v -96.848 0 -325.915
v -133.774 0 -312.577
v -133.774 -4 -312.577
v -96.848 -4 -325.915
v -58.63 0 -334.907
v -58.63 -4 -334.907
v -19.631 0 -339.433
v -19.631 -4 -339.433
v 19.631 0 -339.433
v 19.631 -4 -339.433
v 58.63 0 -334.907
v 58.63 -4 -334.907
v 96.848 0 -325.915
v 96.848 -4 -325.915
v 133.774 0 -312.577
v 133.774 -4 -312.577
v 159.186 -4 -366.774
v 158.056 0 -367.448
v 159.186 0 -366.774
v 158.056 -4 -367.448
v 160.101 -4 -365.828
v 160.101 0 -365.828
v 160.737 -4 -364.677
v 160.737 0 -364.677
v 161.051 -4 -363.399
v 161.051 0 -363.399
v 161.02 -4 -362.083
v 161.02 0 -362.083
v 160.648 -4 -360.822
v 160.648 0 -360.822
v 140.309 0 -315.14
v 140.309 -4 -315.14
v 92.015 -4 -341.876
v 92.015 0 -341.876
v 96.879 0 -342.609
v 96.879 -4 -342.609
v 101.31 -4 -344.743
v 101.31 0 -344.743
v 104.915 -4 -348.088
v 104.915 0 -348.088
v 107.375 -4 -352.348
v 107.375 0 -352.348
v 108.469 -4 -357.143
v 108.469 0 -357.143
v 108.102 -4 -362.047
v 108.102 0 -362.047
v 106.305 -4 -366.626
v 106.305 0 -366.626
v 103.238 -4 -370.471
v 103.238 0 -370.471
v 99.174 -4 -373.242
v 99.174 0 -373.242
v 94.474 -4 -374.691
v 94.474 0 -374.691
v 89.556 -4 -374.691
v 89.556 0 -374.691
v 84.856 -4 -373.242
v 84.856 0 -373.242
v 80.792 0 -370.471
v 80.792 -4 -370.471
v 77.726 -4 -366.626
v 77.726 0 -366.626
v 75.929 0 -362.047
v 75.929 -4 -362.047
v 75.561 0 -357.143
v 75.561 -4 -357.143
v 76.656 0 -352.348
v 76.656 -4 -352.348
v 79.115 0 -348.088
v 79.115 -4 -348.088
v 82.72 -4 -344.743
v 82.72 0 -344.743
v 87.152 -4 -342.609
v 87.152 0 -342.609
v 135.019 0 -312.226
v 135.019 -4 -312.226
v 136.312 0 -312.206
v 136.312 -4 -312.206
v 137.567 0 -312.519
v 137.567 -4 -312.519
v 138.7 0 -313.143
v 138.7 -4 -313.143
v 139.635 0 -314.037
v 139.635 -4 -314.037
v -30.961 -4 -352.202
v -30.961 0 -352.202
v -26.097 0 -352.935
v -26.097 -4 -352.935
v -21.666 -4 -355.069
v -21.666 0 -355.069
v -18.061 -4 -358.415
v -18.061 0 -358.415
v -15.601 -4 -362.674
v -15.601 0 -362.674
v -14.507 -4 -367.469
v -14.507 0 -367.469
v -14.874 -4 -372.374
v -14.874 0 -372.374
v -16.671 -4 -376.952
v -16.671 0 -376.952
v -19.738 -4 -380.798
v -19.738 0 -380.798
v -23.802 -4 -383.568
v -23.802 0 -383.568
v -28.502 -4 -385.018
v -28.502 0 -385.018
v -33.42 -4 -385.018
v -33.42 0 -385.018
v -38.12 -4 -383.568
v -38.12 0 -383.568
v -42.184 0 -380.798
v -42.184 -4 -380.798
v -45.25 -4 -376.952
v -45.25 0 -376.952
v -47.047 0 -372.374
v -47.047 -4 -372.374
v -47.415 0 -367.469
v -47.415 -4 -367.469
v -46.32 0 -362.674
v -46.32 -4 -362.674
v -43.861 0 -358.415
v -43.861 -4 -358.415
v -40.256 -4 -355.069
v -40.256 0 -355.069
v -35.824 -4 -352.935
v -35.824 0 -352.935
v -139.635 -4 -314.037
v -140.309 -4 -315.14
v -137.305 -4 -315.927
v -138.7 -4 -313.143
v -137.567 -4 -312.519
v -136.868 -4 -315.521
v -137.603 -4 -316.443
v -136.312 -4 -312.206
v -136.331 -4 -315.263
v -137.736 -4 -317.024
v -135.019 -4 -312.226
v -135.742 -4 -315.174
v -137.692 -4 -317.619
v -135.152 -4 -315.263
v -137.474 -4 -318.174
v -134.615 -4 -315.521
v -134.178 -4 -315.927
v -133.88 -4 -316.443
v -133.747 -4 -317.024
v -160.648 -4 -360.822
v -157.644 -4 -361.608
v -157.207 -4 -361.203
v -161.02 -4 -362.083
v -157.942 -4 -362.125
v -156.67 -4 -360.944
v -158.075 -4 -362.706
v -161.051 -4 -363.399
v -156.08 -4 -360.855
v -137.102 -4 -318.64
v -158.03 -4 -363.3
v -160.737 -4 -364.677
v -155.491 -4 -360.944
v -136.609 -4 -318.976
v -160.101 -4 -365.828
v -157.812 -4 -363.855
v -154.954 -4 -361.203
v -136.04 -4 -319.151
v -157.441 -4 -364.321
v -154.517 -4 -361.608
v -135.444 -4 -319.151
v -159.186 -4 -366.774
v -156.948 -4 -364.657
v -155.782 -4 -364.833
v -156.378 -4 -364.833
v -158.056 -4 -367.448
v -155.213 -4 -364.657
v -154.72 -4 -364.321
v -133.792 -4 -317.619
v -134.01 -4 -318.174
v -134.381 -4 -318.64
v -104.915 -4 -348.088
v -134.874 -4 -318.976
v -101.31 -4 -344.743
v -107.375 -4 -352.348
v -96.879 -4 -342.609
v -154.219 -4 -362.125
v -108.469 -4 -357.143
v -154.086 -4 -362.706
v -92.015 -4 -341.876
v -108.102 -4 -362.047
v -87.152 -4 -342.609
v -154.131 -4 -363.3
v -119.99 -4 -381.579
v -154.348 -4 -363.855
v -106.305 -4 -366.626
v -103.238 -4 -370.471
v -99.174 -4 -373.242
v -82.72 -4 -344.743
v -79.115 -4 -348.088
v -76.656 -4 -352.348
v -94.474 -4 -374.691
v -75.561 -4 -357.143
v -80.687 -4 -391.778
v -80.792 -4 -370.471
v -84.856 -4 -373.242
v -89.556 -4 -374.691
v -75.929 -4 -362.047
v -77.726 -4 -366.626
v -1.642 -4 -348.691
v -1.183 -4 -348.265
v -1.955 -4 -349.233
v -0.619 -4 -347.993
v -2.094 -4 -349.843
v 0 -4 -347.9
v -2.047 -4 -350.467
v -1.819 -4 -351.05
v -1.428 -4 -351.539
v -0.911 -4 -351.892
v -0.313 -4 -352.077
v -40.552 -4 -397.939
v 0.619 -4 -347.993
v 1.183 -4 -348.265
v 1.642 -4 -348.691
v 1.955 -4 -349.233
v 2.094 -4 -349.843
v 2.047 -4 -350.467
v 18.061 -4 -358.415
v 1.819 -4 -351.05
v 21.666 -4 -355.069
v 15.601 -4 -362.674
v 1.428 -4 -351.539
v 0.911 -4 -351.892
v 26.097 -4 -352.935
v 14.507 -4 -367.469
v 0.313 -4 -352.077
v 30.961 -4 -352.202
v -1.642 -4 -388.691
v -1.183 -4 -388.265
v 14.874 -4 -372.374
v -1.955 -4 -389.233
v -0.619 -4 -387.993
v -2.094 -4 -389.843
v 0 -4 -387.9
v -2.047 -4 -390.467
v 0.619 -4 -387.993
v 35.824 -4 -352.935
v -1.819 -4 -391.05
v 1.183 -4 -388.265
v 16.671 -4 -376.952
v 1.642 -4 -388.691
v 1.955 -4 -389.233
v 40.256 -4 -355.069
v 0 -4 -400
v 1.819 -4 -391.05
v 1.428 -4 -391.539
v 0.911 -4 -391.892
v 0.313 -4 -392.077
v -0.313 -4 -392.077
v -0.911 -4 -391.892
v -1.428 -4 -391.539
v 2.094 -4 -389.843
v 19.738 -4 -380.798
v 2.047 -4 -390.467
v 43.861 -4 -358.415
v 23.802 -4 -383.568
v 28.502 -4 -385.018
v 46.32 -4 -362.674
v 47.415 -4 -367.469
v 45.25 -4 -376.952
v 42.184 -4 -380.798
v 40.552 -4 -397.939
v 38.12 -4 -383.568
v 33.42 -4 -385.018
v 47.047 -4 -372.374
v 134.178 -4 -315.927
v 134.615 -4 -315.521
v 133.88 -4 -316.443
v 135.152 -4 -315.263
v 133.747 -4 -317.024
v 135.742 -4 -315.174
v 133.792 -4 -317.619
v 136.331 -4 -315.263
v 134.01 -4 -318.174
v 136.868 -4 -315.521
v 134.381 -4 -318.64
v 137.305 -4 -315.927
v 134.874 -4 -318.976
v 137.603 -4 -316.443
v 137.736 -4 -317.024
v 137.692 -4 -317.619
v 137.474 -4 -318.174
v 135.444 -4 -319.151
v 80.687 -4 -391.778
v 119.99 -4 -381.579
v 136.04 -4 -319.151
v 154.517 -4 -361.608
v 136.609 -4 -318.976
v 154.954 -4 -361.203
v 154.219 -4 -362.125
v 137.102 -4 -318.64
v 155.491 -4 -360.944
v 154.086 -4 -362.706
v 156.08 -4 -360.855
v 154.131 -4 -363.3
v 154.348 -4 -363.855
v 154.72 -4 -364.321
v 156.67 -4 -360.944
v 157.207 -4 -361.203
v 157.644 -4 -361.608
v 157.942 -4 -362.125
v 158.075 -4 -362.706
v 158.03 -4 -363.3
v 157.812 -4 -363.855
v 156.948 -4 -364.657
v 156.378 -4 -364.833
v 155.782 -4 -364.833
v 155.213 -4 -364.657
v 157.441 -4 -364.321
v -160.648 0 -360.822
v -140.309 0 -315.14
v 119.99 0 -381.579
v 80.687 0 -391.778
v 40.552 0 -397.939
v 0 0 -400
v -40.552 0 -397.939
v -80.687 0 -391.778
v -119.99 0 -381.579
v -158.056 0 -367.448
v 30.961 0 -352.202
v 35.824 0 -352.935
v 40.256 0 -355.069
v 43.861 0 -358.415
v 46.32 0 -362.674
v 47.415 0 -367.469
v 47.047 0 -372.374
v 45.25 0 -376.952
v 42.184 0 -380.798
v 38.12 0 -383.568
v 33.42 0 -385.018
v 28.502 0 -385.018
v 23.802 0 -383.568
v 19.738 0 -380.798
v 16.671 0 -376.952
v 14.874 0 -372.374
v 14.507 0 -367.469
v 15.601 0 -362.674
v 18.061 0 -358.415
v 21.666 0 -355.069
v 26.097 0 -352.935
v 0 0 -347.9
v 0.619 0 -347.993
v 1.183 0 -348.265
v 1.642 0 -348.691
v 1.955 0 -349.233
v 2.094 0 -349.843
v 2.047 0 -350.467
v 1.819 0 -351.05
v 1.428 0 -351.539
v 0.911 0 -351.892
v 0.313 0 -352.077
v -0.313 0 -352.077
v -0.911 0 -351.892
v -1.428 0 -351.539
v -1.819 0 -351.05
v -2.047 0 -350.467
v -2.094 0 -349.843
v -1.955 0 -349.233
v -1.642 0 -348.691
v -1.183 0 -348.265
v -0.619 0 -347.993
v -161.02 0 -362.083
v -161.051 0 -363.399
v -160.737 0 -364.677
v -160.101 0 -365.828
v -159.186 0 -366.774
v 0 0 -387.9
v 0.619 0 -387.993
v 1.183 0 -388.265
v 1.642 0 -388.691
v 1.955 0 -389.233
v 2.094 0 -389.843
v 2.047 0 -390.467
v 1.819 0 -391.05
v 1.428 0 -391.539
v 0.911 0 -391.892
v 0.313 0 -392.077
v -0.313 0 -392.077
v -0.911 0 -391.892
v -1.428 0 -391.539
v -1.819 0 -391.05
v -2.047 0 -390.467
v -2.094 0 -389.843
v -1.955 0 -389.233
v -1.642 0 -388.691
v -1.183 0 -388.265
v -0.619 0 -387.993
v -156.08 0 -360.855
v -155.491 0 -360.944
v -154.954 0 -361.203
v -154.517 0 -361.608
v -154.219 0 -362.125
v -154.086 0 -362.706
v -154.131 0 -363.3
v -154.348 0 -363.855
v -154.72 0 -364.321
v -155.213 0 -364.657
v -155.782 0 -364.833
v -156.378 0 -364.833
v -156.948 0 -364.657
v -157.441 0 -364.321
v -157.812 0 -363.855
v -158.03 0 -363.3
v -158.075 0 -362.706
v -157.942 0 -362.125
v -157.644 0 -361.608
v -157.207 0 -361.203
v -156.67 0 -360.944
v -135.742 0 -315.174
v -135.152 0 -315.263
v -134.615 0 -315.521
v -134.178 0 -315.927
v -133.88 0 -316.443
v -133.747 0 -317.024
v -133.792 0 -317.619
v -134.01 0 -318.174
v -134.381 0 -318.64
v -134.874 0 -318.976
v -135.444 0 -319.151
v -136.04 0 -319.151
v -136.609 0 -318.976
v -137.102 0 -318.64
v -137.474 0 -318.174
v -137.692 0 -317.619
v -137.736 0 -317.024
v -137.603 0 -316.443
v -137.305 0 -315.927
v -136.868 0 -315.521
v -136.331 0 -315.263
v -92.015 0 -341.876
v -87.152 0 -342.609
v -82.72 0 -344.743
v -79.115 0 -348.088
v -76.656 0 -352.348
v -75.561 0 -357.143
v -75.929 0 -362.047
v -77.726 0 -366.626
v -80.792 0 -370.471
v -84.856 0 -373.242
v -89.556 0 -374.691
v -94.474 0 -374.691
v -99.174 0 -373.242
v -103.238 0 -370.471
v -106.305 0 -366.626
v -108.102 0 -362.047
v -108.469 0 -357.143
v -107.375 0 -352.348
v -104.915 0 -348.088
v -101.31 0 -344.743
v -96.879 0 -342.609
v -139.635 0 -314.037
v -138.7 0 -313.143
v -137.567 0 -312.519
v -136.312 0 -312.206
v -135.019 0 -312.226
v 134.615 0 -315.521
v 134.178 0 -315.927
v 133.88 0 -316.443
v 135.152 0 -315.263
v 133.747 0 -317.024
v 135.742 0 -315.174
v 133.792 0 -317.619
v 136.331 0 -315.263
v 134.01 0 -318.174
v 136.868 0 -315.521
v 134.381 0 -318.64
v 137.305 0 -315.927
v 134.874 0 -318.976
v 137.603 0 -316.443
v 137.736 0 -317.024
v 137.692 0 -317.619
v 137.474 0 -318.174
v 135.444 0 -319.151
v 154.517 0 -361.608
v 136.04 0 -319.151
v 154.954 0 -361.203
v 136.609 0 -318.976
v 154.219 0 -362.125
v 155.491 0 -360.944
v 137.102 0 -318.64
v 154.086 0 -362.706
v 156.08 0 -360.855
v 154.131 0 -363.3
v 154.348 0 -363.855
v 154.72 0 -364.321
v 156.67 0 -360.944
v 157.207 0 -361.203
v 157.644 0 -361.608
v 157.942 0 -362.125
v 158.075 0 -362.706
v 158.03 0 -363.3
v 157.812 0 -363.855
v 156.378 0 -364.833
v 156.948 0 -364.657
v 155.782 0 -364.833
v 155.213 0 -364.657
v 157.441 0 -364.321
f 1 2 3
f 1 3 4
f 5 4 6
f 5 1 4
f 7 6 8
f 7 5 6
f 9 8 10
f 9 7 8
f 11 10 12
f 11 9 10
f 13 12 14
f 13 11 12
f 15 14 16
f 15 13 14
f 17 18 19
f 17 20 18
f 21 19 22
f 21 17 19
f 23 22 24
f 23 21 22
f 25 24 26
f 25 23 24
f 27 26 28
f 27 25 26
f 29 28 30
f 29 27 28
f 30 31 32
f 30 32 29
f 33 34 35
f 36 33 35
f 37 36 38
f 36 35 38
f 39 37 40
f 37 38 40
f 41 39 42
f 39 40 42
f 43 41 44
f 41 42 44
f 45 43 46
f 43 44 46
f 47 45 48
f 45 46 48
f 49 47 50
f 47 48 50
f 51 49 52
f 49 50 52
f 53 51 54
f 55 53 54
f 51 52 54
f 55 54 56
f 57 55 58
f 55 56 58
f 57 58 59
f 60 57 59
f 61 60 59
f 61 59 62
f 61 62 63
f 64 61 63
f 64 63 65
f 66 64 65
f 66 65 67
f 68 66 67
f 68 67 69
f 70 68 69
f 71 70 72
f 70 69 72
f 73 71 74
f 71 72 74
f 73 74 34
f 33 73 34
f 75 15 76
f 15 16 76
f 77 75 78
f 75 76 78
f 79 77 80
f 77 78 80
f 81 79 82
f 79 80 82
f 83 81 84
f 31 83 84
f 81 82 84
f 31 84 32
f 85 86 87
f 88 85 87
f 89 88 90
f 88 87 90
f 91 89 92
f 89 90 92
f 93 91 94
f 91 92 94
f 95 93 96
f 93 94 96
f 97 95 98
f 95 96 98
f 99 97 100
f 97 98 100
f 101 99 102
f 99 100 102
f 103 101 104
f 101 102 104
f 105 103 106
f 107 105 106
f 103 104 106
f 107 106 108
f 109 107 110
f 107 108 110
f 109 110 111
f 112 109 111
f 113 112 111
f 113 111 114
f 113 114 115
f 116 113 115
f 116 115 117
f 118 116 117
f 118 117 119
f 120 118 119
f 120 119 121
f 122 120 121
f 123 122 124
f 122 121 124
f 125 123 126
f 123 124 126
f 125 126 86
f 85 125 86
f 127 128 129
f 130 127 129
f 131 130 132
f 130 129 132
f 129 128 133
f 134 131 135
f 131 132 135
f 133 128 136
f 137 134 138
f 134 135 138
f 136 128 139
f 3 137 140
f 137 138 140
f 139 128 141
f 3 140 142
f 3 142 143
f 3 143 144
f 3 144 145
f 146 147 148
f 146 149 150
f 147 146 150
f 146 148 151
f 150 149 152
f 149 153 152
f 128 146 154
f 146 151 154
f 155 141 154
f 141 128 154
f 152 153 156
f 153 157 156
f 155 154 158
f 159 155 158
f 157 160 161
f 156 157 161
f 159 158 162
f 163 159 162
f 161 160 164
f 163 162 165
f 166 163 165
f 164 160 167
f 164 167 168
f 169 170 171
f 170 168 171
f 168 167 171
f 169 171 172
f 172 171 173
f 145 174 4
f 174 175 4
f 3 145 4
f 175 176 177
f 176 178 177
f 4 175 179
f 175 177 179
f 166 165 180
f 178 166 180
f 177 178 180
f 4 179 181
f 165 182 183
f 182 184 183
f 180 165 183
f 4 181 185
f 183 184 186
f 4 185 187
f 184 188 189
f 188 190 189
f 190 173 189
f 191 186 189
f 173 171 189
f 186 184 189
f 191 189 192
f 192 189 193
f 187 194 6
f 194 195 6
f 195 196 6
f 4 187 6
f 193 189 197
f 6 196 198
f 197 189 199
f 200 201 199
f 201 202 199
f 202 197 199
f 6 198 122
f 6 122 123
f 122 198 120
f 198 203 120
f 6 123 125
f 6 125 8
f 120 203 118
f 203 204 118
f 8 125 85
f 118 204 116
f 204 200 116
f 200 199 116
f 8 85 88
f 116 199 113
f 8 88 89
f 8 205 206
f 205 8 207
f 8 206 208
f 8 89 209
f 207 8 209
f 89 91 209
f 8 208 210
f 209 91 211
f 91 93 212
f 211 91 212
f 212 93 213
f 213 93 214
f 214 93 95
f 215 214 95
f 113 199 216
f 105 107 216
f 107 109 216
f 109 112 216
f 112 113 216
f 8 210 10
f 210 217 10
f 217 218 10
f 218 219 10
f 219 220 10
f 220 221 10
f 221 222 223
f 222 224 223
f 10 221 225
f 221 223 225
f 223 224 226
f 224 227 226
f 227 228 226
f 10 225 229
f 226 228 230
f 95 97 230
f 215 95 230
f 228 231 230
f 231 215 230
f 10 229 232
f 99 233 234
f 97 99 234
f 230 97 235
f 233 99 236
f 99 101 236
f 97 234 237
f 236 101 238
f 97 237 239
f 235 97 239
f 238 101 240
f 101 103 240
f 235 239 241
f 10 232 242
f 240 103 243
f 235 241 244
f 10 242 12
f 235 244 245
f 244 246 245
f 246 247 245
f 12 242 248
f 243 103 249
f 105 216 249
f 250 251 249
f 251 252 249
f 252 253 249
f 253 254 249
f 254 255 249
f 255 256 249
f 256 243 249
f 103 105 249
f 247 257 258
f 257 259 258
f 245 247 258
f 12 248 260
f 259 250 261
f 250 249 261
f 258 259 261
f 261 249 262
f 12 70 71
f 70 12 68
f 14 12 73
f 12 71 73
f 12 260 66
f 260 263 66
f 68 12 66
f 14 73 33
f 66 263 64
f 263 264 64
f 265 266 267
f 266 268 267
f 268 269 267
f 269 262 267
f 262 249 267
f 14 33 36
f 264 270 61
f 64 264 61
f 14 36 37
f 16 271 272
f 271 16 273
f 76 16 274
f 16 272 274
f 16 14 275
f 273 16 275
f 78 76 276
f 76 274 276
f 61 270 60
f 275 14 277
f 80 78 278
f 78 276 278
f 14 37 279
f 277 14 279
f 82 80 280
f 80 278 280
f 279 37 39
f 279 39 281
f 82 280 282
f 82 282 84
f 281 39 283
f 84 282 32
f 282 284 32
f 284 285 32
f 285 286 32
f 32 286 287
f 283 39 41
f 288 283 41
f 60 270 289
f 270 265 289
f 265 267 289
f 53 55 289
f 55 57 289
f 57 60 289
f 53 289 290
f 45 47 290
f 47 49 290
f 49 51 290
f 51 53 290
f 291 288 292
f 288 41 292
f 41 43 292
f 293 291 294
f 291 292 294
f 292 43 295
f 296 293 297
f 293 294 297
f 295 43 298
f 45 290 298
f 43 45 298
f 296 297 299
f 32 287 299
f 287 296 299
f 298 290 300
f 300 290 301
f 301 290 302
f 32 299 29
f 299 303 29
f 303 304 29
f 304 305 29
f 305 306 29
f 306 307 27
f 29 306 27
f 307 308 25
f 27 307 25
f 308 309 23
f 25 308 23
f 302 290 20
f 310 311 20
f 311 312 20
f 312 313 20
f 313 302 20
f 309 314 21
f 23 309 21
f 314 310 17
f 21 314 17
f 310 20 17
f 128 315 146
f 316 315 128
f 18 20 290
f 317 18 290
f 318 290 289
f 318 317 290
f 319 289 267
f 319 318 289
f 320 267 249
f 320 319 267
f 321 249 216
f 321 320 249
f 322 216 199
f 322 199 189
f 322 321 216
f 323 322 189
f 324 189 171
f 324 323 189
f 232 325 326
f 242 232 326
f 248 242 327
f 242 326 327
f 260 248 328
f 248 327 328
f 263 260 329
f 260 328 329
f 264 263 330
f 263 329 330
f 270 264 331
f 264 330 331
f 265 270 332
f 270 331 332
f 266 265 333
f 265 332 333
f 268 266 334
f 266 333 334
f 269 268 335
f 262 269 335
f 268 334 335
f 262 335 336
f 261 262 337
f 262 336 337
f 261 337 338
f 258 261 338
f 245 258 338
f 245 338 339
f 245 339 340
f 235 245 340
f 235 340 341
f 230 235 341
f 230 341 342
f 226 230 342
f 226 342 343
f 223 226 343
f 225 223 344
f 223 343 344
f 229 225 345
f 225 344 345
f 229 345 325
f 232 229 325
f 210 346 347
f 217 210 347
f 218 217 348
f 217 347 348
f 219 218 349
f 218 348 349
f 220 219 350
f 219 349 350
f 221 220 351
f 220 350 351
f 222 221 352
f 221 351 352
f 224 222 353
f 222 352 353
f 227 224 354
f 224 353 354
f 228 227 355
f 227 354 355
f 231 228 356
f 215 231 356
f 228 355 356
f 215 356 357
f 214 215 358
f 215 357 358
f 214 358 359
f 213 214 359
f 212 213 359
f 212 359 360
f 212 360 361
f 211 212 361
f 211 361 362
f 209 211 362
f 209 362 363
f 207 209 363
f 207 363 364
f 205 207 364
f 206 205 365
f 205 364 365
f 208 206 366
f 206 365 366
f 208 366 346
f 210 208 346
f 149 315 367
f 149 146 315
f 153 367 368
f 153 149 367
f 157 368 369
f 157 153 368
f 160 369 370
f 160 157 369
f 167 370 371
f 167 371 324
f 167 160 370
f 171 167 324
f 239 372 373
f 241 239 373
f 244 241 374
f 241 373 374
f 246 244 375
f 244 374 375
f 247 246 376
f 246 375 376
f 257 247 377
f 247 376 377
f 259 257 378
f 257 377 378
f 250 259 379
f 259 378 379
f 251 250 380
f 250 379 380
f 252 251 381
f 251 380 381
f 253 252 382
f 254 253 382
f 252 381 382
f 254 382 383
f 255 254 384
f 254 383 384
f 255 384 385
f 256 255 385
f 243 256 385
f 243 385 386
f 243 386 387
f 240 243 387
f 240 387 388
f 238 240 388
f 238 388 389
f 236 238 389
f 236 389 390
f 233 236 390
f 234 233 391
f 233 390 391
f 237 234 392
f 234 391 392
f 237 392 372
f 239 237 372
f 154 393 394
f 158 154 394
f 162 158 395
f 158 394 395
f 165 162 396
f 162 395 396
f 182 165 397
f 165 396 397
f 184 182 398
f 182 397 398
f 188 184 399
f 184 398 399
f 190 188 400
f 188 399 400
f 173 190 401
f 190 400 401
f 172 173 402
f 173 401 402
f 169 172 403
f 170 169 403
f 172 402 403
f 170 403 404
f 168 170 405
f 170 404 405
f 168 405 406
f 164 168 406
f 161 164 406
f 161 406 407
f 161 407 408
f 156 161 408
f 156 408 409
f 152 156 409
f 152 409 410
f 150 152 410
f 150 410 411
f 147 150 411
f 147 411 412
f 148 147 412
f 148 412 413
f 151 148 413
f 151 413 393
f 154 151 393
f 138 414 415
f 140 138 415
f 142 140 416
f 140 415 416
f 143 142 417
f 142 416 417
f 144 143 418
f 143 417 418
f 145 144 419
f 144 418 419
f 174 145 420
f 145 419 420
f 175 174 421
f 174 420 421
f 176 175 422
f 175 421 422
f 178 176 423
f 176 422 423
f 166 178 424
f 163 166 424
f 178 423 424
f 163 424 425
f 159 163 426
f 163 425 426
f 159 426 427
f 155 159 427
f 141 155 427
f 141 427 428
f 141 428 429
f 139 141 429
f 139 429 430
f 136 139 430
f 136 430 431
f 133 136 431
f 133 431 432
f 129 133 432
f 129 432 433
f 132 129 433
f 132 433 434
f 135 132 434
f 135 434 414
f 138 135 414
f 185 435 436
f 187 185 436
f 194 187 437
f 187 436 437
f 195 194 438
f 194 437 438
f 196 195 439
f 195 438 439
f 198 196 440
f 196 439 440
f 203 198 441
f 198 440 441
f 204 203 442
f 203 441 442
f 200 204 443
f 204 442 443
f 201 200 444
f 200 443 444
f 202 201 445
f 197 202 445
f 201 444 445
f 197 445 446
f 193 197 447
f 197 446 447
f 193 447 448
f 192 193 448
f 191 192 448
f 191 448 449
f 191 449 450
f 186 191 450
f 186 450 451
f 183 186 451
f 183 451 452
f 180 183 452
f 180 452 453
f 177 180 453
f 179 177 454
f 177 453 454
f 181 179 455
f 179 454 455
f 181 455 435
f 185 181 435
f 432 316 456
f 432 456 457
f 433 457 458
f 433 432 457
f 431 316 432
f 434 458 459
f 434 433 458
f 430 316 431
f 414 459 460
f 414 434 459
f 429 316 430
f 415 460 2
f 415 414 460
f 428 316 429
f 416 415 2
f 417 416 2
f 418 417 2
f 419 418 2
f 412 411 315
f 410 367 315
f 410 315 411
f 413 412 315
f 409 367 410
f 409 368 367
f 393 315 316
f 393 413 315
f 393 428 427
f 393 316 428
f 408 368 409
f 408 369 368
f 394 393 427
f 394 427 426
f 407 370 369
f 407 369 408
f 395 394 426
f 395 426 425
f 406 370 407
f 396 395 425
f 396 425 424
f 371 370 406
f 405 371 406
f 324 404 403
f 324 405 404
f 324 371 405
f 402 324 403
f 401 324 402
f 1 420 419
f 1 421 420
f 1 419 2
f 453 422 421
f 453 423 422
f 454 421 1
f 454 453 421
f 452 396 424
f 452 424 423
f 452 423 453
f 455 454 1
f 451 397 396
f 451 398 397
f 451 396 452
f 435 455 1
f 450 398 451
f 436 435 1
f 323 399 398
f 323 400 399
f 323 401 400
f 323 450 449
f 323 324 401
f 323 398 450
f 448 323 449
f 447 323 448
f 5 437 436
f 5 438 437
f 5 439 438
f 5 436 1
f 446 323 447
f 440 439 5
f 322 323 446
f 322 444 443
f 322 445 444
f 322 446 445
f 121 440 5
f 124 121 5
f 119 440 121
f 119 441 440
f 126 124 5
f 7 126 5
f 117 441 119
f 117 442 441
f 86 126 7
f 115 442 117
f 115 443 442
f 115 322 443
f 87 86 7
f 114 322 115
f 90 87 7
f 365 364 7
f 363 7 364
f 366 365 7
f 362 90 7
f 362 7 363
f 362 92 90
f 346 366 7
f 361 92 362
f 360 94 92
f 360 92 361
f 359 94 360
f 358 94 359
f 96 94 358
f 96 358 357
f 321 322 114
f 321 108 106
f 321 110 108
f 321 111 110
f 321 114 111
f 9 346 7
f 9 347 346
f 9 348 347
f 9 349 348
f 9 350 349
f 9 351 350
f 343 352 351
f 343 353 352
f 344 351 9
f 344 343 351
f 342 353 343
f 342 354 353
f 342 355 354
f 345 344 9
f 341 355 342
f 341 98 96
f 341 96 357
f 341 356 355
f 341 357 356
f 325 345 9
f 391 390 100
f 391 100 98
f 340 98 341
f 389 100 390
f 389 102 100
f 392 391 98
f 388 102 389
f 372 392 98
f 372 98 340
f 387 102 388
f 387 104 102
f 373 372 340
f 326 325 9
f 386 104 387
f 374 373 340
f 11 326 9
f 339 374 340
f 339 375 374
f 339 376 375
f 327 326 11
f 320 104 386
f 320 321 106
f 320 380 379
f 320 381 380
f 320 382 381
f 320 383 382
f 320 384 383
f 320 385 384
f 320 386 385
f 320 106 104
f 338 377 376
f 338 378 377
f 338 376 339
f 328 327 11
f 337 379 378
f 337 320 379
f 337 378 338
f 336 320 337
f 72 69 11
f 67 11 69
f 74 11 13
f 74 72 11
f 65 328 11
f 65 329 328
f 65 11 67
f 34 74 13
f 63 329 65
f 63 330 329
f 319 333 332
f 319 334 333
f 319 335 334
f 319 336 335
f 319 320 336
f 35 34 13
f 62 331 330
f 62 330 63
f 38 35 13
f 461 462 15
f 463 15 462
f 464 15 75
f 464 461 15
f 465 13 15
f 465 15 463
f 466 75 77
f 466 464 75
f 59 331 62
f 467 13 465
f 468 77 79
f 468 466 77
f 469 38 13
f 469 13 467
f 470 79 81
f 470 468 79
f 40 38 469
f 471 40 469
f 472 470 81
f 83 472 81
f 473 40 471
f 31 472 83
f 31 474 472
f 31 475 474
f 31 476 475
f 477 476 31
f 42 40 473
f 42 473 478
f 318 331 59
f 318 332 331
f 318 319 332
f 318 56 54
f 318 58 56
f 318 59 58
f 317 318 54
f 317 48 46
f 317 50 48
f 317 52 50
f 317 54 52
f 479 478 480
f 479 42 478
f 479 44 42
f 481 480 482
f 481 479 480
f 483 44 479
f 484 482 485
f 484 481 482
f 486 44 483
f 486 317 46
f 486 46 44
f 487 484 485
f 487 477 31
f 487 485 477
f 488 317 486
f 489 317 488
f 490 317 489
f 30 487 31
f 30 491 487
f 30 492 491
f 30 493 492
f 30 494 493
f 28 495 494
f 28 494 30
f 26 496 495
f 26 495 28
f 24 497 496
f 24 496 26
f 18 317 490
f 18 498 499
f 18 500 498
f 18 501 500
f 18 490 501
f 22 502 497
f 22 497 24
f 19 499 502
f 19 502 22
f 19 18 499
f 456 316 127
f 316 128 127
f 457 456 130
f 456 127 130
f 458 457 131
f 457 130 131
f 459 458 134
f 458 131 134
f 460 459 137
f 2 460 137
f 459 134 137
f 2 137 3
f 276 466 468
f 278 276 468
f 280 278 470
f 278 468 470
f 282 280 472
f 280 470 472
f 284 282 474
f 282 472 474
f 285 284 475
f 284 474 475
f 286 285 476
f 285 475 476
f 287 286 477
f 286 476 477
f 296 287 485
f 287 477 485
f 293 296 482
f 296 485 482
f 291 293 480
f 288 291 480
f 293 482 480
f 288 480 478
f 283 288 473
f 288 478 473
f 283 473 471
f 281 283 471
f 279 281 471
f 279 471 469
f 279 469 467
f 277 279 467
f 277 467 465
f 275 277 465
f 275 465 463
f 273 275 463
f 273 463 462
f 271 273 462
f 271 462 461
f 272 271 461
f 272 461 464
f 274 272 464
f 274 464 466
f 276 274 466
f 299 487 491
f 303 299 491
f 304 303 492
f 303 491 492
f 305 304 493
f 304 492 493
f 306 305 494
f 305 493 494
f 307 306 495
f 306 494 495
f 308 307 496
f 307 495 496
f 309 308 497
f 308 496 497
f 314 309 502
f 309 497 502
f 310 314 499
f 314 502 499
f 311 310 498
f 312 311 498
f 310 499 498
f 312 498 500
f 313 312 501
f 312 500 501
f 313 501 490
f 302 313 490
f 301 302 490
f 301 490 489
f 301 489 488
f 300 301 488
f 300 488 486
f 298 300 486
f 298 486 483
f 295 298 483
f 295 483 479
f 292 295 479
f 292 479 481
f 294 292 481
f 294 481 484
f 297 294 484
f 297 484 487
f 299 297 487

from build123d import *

# Parameters (mm, degrees)
SKETCH_1_R             = 16.5
SKETCH_1_R_2           = 2.1
SM_BASE_FLANGE_1_DEPTH = 4
FILLET_1_R             = 5
SKETCH_2_R             = 2
CUT_EXTRUDE_1_DEPTH    = 10


# Sheet-metal steps are written as plain solids
with BuildPart() as part:
    # Sketch 1 → Базовая кромка1 (new body)
    with BuildSketch(Plane(origin=(0, 0, 0), x_dir=(1, 0, 0), z_dir=(0, 1, 0))):
        with BuildLine():
            Line((-162.69465723, 365.418183057), (-138.290458646, 310.605455598))
            ThreePointArc((-138.290458646, 310.605455598), (0, 340), (138.290458646, 310.605455598))
            Line((138.290458646, 310.605455598), (162.69465723, 365.418183057))
            ThreePointArc((162.69465723, 365.418183057), (0, 400), (-162.69465723, 365.418183057))
        make_face()
        with Locations(Location((30.960802033, 368.702357922, 0), (0, 0, 270))):
            Circle(SKETCH_1_R, mode=Mode.SUBTRACT)
        with Locations(Location((-30.960802033, 368.702357922, 0), (0, 0, 270))):
            Circle(SKETCH_1_R, mode=Mode.SUBTRACT)
        with Locations(Location((92.015258251, 358.375769618, 0), (0, 0, 270))):
            Circle(SKETCH_1_R, mode=Mode.SUBTRACT)
        with Locations(Location((-92.015258251, 358.375769618, 0), (0, 0, 270))):
            Circle(SKETCH_1_R, mode=Mode.SUBTRACT)
        with Locations(Location((0, 350, 0), (0, 0, 270))):
            Circle(SKETCH_1_R_2, mode=Mode.SUBTRACT)
        with Locations(Location((0, 390, 0), (0, 0, 270))):
            Circle(SKETCH_1_R_2, mode=Mode.SUBTRACT)
    extrude(amount=-SM_BASE_FLANGE_1_DEPTH)

    # Скругление1
    fillet_1_edges = [part.edges().sort_by_distance(p)[0] for p in [
        (-138.290458646, -2, -310.605455598),
        (-162.69465723, -2, -365.418183057),
        (162.69465723, -2, -365.418183057),
        (138.290458646, -2, -310.605455598),
    ]]
    fillet(fillet_1_edges, radius=FILLET_1_R)

    # Эскиз2 → Вырез-Вытянуть1 (cut)
    with BuildSketch(Plane(origin=(0, 0, 0), x_dir=(1, 0, 0), z_dir=(0, 1, 0))):
        with Locations(Location((156.080374798, 362.85522816, 0), (0, 0, 270))):
            Circle(SKETCH_2_R)
        with Locations(Location((135.741676964, 317.173764891, 0), (0, 0, 270))):
            Circle(SKETCH_2_R)
        with Locations(Location((-135.741676964, 317.173764891, 0), (0, 0, 270))):
            Circle(SKETCH_2_R)
        with Locations(Location((-156.080374798, 362.85522816, 0), (0, 0, 270))):
            Circle(SKETCH_2_R)
    extrude(amount=-CUT_EXTRUDE_1_DEPTH, mode=Mode.SUBTRACT)


solid = part.part
